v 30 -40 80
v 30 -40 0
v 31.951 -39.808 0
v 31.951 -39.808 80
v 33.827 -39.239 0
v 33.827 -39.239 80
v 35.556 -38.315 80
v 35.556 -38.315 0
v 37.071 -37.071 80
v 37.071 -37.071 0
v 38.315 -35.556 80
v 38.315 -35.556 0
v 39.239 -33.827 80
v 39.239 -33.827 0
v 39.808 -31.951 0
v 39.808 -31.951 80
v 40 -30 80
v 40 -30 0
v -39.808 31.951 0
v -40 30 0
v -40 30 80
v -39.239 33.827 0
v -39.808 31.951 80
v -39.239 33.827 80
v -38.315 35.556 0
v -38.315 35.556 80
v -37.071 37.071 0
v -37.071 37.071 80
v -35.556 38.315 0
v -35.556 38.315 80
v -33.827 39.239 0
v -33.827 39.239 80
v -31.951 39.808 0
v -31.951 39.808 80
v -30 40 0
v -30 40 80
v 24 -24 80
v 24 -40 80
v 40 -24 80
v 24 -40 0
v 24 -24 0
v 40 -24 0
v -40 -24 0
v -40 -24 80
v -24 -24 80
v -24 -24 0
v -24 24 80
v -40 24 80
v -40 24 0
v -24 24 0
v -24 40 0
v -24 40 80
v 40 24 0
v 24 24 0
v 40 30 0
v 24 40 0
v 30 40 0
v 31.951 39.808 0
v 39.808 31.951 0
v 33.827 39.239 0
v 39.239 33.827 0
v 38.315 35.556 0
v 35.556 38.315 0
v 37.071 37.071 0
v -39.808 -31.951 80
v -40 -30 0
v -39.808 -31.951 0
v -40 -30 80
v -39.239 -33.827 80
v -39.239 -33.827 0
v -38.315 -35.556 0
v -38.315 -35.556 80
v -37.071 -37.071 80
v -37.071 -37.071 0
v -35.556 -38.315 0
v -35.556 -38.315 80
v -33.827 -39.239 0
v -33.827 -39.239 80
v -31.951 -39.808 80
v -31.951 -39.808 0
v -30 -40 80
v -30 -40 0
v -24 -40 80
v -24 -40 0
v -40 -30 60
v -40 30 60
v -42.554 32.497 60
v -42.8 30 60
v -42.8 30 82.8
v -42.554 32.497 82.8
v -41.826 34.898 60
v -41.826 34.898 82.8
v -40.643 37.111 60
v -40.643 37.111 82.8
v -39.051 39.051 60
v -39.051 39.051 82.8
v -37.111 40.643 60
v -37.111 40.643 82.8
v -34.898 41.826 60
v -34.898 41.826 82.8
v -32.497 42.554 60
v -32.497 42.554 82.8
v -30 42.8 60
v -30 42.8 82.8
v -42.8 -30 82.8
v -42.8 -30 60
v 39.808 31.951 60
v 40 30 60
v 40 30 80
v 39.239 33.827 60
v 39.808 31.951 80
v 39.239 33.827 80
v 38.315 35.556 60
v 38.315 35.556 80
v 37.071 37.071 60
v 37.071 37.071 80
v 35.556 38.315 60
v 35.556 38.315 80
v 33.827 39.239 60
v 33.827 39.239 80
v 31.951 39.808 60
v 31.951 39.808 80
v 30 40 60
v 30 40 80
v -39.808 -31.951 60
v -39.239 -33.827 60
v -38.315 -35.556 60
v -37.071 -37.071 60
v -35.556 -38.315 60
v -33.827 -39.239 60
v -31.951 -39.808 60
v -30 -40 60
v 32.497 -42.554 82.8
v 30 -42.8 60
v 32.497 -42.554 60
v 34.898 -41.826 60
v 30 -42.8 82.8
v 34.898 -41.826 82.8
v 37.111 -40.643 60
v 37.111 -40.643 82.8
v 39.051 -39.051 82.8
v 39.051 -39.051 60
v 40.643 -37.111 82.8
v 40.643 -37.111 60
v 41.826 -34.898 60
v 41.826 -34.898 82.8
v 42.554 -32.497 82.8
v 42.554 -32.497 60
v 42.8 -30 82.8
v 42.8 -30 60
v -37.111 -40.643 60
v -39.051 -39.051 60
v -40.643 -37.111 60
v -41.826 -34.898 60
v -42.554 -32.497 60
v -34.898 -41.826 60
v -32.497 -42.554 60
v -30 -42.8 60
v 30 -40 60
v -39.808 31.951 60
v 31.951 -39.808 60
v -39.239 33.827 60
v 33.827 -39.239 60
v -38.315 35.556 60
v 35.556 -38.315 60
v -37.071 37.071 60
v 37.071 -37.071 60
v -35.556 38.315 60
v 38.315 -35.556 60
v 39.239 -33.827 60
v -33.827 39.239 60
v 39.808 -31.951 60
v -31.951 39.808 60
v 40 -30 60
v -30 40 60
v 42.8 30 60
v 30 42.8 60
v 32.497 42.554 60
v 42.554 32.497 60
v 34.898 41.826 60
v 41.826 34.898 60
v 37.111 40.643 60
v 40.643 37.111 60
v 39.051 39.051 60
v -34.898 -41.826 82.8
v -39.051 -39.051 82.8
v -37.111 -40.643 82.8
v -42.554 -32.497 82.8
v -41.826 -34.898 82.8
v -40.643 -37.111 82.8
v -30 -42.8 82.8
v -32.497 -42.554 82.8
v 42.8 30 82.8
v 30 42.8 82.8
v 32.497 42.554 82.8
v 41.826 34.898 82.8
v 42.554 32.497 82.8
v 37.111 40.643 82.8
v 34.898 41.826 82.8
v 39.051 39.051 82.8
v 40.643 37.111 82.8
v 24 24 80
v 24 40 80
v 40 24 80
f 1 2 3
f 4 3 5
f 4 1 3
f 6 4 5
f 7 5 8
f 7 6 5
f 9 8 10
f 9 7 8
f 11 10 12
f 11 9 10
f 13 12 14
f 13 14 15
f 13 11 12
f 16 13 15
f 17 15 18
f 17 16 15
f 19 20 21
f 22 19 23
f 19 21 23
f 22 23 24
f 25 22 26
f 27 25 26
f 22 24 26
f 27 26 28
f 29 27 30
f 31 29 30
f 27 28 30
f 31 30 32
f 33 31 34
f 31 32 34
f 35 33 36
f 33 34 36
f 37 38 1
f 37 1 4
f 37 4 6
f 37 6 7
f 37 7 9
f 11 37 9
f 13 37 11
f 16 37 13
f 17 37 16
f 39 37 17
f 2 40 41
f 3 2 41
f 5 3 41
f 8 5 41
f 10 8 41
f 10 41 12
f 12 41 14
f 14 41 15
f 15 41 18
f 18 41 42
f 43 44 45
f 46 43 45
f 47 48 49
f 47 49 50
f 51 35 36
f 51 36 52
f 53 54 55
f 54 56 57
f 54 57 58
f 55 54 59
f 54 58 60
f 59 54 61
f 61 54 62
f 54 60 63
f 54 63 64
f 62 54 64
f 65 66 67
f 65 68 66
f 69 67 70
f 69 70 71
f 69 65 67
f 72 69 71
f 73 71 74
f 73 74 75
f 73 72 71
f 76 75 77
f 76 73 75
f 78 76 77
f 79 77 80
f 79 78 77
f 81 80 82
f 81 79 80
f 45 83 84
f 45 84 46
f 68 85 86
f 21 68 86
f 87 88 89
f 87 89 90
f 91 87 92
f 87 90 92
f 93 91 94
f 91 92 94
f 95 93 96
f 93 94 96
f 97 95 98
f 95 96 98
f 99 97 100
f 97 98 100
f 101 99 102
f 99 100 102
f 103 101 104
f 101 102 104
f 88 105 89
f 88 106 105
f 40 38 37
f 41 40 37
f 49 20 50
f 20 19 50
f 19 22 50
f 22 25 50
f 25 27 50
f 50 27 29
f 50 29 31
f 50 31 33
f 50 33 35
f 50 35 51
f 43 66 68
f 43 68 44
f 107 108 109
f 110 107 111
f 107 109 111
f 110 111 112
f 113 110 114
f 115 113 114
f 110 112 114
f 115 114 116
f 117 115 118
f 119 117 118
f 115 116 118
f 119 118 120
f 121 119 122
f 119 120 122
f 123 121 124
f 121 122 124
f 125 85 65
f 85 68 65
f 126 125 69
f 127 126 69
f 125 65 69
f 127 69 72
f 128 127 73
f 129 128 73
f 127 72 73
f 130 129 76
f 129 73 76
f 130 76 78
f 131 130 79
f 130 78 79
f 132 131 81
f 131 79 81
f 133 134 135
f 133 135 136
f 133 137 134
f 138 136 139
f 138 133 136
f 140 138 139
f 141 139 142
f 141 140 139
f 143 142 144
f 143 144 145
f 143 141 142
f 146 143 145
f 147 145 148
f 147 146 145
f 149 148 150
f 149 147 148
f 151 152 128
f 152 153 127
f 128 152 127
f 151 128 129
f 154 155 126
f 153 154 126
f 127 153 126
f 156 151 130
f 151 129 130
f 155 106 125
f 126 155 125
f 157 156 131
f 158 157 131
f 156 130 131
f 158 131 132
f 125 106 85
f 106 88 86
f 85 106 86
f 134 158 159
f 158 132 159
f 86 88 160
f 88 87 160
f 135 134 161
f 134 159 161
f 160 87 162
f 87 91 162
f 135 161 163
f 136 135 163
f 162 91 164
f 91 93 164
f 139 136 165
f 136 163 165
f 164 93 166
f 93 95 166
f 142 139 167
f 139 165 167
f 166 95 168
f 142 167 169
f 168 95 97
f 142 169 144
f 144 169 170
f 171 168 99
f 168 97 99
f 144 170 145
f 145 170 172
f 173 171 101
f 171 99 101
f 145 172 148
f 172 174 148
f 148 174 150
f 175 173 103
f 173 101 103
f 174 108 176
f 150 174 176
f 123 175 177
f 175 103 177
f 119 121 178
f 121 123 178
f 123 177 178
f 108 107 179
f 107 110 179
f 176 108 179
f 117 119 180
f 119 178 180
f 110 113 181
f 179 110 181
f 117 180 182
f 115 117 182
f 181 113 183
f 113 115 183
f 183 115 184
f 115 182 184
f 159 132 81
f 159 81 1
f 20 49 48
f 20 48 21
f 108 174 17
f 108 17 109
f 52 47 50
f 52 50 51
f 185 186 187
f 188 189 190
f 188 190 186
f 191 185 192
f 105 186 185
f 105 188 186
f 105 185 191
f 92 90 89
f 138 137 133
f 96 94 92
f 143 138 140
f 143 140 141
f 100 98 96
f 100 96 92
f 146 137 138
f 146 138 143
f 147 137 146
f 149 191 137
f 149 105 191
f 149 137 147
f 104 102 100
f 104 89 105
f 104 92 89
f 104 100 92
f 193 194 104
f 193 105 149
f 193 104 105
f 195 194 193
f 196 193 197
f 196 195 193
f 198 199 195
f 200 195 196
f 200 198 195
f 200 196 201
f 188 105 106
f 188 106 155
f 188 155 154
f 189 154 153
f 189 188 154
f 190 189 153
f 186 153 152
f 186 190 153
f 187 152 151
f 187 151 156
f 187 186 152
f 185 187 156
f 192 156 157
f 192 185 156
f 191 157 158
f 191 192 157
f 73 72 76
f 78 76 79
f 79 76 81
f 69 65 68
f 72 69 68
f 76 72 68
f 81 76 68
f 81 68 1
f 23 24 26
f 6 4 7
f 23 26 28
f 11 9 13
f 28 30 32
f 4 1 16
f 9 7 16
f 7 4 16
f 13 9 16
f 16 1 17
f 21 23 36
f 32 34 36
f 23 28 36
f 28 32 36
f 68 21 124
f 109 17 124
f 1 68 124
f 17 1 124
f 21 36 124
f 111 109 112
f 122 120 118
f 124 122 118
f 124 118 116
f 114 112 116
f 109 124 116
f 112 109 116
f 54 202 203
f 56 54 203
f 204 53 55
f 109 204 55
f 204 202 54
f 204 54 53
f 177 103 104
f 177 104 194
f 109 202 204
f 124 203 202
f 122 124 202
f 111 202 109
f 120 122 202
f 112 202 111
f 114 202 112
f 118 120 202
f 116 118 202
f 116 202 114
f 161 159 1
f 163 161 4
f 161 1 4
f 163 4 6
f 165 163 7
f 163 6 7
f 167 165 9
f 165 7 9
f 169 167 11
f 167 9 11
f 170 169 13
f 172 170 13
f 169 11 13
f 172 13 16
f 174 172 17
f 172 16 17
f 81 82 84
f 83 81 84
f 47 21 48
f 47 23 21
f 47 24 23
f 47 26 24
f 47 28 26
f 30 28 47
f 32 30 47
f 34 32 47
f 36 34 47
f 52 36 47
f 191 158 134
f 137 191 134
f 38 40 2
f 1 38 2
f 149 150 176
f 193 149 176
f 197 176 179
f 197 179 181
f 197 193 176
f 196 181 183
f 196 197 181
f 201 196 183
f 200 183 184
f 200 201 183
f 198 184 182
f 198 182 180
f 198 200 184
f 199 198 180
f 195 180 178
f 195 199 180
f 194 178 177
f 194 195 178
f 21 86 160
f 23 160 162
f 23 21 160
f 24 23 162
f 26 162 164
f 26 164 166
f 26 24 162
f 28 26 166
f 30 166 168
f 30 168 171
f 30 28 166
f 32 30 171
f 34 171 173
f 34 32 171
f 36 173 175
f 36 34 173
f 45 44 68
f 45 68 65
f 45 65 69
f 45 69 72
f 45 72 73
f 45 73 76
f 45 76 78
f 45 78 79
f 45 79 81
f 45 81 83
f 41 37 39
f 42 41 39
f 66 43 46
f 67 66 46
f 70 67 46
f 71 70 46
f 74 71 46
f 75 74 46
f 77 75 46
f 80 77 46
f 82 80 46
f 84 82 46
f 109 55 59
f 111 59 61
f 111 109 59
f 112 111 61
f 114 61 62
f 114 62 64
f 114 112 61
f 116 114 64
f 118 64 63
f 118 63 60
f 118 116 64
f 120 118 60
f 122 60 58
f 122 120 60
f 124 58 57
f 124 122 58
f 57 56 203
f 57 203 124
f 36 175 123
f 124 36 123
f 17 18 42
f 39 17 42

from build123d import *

# Parameters (mm, degrees)
F0_W     = 16
F0_H     = 16
F1_DEPTH = 80
F3_START = 60
F2_W     = 80
F2_H     = 80
F3_DEPTH = 20
F4_R     = 10
F4_2_R   = 10
F4_3_R   = 10
F4_4_R   = 10
F4_5_R   = 10
F5_T     = 2.8


with BuildPart() as f1:
    # F0 (on Top) → F1 (new body)
    with BuildSketch(Plane.XY):
        with Locations((-32, 32)):
            Rectangle(F0_W, F0_H)
    extrude(amount=F1_DEPTH)

    # F4#5
    f4_5_edges = [f1.edges().sort_by_distance(p)[0] for p in [
        (-40, 40, 40),
    ]]
    fillet(f4_5_edges, radius=F4_5_R)


with BuildPart() as f1b:
    # F0 (on Top) → F1, piece 2 (new body)
    with BuildSketch(Plane.XY):
        with Locations((32, 32)):
            Rectangle(F0_W, F0_H)
    extrude(amount=F1_DEPTH)

    # F4#2
    f4_2_edges = [f1b.edges().sort_by_distance(p)[0] for p in [
        (40, 40, 40),
    ]]
    fillet(f4_2_edges, radius=F4_2_R)


with BuildPart() as f1c:
    # F0 (on Top) → F1, piece 3 (new body)
    with BuildSketch(Plane.XY):
        with Locations((32, -32)):
            Rectangle(F0_W, F0_H)
    extrude(amount=F1_DEPTH)

    # F4#3
    f4_3_edges = [f1c.edges().sort_by_distance(p)[0] for p in [
        (40, -40, 40),
    ]]
    fillet(f4_3_edges, radius=F4_3_R)


with BuildPart() as f1d:
    # F0 (on Top) → F1, piece 4 (new body)
    with BuildSketch(Plane.XY):
        with Locations((-32, -32)):
            Rectangle(F0_W, F0_H)
    extrude(amount=F1_DEPTH)

    # F4#4
    f4_4_edges = [f1d.edges().sort_by_distance(p)[0] for p in [
        (-40, -40, 40),
    ]]
    fillet(f4_4_edges, radius=F4_4_R)


with BuildPart() as f3:
    # F2 (on Top) → F3 (new body)
    with BuildSketch(Plane.XY.offset(F3_START)):
        Rectangle(F2_W, F2_H)
    extrude(amount=F3_DEPTH)

    # F4
    f4_edges = [f3.edges().sort_by_distance(p)[0] for p in [
        (-40, -40, 70),
        (40, -40, 70),
        (40, 40, 70),
        (-40, 40, 70),
    ]]
    fillet(f4_edges, radius=F4_R)

    # F5
    f5_openings = [f3.faces().sort_by_distance(p)[0] for p in [
        (0, 0, 60),
    ]]
    offset(amount=F5_T, openings=f5_openings, kind=Kind.INTERSECTION)


solid = Compound([f1.part, f1b.part, f1c.part, f1d.part, f3.part])
